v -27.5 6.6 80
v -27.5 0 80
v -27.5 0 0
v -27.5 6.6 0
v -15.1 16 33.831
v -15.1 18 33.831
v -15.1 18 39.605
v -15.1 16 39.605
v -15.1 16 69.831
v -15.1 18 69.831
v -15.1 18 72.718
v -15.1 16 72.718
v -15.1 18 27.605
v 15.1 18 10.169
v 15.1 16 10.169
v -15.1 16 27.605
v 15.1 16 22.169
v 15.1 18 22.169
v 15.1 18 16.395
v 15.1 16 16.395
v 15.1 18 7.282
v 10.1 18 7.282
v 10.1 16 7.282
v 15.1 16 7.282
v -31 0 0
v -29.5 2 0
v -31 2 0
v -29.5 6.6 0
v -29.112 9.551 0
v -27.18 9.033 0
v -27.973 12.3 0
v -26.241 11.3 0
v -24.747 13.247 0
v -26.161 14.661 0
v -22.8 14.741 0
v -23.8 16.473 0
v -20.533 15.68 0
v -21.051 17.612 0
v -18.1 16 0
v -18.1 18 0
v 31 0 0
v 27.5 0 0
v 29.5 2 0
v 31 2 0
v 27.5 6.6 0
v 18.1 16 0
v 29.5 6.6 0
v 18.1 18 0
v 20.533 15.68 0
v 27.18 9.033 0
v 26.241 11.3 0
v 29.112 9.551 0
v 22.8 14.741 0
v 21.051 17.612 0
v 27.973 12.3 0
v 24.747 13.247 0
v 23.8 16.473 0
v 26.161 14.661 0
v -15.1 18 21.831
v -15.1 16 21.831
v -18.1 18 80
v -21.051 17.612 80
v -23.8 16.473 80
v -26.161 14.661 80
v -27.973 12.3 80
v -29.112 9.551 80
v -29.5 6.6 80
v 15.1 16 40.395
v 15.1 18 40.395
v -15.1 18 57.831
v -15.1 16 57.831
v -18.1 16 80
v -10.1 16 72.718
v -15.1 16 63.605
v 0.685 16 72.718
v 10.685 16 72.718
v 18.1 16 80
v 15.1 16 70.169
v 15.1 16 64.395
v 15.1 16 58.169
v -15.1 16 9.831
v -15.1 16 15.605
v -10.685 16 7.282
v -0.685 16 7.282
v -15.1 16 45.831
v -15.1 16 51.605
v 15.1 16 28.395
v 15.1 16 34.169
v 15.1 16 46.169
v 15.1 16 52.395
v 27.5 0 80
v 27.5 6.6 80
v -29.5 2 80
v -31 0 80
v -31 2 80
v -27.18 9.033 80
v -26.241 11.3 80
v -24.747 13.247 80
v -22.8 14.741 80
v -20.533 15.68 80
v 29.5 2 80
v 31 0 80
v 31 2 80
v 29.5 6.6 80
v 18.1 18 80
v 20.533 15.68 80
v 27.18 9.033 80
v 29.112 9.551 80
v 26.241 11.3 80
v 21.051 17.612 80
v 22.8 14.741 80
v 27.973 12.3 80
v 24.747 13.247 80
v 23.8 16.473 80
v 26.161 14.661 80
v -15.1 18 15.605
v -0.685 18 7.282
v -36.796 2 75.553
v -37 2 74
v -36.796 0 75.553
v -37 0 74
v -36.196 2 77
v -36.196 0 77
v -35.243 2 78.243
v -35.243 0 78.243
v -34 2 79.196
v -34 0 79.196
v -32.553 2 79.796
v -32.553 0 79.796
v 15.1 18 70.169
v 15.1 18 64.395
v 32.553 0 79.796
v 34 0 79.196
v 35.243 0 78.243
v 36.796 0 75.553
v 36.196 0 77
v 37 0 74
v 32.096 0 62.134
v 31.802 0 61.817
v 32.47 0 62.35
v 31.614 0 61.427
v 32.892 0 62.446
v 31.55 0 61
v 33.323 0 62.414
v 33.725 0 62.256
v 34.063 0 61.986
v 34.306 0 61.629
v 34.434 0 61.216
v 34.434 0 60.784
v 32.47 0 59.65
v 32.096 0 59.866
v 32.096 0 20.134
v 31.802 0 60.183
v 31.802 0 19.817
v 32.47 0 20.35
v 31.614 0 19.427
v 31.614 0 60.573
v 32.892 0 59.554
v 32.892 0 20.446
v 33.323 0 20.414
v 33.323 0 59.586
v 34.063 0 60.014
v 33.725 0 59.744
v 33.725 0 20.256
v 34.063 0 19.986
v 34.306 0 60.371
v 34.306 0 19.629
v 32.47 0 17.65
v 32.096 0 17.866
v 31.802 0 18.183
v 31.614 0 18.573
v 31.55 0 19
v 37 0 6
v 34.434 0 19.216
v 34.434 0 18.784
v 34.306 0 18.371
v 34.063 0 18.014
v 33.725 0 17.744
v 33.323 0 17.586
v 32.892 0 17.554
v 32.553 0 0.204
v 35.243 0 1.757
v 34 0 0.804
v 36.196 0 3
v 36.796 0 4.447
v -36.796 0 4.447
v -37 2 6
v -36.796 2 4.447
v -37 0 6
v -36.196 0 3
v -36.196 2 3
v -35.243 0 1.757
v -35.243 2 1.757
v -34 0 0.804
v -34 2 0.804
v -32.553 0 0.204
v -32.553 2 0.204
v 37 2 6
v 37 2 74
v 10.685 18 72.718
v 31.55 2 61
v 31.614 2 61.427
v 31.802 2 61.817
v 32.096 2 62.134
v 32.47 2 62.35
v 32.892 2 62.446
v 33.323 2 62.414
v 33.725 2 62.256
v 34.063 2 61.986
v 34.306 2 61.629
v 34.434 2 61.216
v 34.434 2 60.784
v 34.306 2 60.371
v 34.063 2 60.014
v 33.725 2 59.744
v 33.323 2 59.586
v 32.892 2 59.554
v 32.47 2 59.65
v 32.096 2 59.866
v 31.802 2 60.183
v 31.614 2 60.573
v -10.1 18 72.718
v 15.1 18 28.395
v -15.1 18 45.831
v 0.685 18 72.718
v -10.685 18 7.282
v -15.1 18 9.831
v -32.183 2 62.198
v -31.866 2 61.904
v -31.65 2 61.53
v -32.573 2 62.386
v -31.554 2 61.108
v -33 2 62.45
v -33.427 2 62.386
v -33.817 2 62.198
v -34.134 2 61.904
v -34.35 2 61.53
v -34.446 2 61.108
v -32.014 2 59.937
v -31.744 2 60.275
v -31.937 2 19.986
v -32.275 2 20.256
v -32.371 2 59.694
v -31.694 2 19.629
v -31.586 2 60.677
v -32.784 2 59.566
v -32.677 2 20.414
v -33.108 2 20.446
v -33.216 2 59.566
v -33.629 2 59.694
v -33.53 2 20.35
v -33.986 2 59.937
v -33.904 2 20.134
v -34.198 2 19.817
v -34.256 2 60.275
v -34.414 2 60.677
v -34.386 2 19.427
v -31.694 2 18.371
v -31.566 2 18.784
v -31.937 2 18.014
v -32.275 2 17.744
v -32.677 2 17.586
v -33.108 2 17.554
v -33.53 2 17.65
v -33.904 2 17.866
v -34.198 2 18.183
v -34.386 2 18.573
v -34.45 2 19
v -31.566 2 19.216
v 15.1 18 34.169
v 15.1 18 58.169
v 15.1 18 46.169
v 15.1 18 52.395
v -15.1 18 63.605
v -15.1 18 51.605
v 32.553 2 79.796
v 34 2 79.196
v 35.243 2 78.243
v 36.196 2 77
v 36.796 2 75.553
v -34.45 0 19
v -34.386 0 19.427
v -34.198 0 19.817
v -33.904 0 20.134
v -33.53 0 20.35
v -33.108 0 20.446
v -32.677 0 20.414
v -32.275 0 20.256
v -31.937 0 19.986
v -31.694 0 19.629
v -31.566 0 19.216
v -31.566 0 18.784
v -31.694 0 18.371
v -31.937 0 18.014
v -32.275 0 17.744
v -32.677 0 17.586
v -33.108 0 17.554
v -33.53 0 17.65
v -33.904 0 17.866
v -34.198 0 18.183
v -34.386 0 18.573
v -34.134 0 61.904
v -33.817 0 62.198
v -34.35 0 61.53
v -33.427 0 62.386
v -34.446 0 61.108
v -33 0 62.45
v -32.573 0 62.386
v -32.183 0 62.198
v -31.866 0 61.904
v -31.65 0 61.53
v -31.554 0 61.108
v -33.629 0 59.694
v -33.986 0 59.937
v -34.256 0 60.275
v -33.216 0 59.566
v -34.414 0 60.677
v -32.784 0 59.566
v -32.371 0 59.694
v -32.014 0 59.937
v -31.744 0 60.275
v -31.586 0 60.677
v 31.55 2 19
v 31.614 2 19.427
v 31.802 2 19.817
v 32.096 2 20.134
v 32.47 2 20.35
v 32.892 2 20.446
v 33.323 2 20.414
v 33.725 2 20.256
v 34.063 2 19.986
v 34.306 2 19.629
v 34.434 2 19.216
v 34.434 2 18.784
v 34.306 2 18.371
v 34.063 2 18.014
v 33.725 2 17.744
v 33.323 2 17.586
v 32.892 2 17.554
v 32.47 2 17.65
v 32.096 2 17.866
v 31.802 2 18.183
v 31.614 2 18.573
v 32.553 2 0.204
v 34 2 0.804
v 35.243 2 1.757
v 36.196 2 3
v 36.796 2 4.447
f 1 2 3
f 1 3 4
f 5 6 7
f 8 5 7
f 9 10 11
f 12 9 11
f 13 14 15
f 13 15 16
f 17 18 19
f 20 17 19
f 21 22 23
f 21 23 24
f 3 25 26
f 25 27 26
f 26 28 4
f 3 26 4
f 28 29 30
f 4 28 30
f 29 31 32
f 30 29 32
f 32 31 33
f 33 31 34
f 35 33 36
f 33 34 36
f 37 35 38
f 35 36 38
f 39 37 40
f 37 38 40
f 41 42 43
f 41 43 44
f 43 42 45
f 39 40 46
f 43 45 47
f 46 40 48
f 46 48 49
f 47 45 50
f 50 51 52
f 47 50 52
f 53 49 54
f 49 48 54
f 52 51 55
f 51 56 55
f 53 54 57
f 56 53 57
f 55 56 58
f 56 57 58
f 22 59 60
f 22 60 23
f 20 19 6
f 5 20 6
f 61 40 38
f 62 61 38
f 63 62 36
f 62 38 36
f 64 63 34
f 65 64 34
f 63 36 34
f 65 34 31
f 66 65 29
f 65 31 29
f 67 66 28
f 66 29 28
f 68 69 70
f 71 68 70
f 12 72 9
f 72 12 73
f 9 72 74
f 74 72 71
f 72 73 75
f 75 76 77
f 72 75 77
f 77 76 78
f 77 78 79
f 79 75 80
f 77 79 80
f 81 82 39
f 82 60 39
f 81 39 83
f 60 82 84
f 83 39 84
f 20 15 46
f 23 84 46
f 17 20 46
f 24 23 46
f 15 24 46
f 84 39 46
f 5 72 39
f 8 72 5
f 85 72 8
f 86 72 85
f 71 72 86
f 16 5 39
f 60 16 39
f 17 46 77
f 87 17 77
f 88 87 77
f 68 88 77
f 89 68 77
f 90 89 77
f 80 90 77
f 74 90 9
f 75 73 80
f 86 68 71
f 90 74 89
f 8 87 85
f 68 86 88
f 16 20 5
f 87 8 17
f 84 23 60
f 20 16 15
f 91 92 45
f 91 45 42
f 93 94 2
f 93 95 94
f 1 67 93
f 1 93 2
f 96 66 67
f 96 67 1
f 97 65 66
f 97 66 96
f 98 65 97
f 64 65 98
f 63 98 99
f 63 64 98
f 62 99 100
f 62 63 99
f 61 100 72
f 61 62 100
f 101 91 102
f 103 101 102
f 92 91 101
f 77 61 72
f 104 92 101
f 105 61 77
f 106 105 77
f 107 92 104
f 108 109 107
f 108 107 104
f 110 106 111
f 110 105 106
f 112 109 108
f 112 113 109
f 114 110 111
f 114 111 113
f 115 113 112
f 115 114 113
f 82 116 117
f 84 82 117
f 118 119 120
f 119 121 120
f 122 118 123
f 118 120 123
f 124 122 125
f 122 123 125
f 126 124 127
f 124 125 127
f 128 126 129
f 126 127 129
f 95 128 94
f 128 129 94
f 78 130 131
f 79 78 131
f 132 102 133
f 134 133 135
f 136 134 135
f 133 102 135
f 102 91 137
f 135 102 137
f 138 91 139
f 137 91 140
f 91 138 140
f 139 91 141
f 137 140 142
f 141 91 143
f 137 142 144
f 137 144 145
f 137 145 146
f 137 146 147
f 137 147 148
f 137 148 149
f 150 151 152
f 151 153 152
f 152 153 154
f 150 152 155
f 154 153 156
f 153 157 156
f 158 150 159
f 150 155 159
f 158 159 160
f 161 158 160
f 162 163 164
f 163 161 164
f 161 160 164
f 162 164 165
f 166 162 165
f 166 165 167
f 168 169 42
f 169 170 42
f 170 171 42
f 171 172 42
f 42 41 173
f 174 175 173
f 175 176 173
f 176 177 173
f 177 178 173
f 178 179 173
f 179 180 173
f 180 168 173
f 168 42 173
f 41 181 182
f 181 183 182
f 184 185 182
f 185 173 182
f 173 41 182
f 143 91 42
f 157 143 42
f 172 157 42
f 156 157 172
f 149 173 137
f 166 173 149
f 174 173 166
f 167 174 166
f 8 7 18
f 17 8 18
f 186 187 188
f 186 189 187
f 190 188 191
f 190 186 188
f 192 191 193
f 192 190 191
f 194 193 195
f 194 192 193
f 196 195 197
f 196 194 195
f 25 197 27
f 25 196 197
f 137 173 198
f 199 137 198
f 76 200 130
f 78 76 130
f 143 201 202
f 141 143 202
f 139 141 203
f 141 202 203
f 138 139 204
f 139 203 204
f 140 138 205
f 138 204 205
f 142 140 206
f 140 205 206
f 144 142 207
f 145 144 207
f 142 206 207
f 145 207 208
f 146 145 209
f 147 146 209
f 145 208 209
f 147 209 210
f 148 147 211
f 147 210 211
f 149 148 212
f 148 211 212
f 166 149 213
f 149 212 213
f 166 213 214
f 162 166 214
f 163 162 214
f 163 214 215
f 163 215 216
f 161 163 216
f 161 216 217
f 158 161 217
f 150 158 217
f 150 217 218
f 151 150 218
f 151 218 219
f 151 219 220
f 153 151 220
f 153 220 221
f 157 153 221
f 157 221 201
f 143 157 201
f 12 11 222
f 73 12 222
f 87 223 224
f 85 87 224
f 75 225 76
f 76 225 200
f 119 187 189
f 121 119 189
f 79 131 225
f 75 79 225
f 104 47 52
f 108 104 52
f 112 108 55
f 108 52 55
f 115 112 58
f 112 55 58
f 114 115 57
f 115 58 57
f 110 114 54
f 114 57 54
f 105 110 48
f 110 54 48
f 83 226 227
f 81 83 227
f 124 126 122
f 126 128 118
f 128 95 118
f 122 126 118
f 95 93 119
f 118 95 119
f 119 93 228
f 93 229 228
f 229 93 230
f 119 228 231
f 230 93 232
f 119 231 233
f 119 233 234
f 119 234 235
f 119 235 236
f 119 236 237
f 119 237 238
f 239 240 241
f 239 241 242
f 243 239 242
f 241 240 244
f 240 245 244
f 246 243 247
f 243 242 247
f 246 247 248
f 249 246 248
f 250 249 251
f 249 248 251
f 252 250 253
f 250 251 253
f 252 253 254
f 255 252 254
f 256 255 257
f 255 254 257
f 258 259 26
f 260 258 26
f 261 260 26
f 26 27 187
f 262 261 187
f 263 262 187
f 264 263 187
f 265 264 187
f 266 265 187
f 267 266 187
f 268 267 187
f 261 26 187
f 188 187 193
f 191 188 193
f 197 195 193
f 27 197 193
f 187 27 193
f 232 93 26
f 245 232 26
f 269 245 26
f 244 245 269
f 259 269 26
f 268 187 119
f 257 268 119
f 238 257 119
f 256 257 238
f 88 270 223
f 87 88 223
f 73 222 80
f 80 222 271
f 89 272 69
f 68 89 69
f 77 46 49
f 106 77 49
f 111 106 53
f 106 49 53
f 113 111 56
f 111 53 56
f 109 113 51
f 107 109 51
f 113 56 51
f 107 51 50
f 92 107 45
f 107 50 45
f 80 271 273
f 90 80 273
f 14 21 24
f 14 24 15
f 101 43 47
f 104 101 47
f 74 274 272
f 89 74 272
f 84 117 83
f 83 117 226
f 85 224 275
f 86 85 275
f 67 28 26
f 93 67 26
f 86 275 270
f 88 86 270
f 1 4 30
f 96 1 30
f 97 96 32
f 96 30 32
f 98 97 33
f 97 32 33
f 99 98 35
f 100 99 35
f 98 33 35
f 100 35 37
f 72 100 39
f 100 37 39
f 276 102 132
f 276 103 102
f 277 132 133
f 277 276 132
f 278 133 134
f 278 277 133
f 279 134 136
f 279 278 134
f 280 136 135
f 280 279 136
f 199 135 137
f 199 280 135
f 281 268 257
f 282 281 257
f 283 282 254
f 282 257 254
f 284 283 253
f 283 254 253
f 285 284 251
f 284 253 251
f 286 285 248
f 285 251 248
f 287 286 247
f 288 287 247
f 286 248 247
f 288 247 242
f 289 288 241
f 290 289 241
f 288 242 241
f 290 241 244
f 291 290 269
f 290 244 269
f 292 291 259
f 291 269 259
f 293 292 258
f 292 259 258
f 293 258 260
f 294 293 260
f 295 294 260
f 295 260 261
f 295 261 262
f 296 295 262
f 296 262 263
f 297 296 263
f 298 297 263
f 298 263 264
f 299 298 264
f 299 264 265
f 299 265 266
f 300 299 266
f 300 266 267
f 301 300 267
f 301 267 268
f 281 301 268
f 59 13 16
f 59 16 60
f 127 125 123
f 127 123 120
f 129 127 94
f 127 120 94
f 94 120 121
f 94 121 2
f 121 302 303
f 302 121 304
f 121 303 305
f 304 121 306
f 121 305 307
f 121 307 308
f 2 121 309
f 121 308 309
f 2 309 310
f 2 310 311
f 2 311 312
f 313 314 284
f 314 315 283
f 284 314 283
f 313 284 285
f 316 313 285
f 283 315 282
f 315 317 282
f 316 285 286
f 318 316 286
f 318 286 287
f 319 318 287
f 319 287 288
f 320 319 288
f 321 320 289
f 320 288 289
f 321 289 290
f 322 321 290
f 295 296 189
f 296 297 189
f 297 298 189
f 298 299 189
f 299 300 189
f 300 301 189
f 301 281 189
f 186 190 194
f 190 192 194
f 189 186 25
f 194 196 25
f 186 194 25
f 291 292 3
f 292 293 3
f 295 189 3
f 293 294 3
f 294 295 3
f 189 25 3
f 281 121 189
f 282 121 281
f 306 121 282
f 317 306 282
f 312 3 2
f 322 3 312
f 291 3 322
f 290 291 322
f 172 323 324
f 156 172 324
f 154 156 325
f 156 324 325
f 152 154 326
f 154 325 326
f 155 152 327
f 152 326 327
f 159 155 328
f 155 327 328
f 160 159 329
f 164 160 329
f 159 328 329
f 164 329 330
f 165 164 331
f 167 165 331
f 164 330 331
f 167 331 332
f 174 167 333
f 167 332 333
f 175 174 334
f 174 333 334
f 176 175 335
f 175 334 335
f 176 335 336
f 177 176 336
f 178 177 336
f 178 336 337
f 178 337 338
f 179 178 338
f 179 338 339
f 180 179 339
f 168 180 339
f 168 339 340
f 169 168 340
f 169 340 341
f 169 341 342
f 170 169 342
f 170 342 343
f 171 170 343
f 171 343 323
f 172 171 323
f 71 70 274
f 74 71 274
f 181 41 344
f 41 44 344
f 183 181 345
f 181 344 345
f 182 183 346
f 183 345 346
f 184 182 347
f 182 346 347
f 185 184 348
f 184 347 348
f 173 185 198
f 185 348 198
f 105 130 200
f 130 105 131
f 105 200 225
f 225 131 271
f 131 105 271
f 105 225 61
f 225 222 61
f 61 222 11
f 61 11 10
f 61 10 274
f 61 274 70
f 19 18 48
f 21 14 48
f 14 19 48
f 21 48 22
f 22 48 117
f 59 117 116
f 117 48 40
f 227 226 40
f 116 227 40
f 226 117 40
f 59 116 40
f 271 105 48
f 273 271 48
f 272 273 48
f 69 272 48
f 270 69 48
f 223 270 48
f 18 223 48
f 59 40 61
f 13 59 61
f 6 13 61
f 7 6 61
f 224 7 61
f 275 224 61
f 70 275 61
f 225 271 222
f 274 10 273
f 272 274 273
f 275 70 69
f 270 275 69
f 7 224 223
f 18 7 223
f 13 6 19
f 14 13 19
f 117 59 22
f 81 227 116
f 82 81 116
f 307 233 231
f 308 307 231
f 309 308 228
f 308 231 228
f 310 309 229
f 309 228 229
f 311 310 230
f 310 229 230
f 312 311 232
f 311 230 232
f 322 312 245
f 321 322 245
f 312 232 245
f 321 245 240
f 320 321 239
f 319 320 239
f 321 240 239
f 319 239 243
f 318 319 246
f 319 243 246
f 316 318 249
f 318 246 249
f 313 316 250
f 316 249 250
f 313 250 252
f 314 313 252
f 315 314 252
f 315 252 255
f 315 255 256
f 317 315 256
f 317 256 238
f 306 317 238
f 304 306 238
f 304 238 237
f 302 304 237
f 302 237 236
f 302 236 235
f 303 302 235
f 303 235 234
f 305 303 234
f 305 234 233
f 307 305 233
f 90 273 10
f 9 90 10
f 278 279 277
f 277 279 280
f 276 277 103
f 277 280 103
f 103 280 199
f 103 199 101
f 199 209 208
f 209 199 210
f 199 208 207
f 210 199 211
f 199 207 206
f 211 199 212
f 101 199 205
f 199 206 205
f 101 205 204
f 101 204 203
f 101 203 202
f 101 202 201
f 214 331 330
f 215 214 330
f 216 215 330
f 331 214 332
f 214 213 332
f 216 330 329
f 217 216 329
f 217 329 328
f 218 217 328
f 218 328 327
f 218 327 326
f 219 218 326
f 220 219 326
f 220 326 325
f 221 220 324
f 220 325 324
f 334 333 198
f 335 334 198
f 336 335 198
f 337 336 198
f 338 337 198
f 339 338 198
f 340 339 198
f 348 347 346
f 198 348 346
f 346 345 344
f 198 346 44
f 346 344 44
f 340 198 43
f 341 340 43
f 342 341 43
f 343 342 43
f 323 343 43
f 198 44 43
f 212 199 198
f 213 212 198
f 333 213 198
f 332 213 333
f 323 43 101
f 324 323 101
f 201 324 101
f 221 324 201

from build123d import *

# Parameters (mm, degrees)
EXTRUDE_1_DEPTH     = 80
SKETCH_2_R          = 1.45
CUT_EXTRUDE_1_DEPTH = 80
FILLET_1_R          = 6
CUT_EXTRUDE_2_DEPTH = 10


with BuildPart() as part:
    # 草图1 → 凸台-拉伸1 (new body)
    with BuildSketch(Plane.XY):
        with BuildLine():
            Line((-37, 0), (-27.5, 0))
            Line((-27.5, 0), (-27.5, 6.6))
            ThreePointArc((-27.5, 6.6), (-24.746803743, 13.246803743), (-18.1, 16))
            Line((-18.1, 16), (18.1, 16))
            ThreePointArc((18.1, 16), (24.746803743, 13.246803743), (27.5, 6.6))
            Line((27.5, 6.6), (27.5, 0))
            Line((27.5, 0), (37, 0))
            Line((37, 0), (37, 2))
            Line((37, 2), (29.5, 2))
            Line((29.5, 2), (29.5, 6.6))
            ThreePointArc((29.5, 6.6), (26.161017306, 14.661017306), (18.1, 18))
            Line((18.1, 18), (-18.1, 18))
            ThreePointArc((-18.1, 18), (-26.161017306, 14.661017306), (-29.5, 6.6))
            Line((-29.5, 6.6), (-29.5, 2))
            Line((-29.5, 2), (-37, 2))
            Line((-37, 2), (-37, 0))
        make_face()
    extrude(amount=EXTRUDE_1_DEPTH)

    # 草图2 → 切除-拉伸1 (cut)
    with BuildSketch(Plane(origin=(0, 2, 0), x_dir=(1, 0, 0), z_dir=(0, 1, 0))):
        with Locations(Location((-33, -19, 0), (0, 0, 180))):
            Circle(SKETCH_2_R)
        with Locations(Location((-33, -61, 0), (0, 0, 270))):
            Circle(SKETCH_2_R)
        with Locations(Location((33, -61, 0), (0, 0, 180))):
            Circle(SKETCH_2_R)
        with Locations(Location((33, -19, 0), (0, 0, 180))):
            Circle(SKETCH_2_R)
    extrude(amount=-CUT_EXTRUDE_1_DEPTH, mode=Mode.SUBTRACT)

    # 圆角1
    fillet_1_edges = [part.edges().sort_by_distance(p)[0] for p in [
        (37, 1, 0),
        (-37, 1, 0),
        (37, 1, 80),
        (-37, 1, 80),
    ]]
    fillet(fillet_1_edges, radius=FILLET_1_R)

    # 草图3 → 切除-拉伸2 (cut)
    with BuildSketch(Plane(origin=(0, 18, 0), x_dir=(1, 0, 0), z_dir=(0, 1, 0))):
        Polygon((0.684609691, -72.718226784), (10.684609691, -72.718226784), (15.1, -70.169), (15.1, -64.395497308), align=None)
        Polygon((-15.1, -72.718226784), (-10.1, -72.718226784), (15.1, -58.169), (15.1, -52.395497308), (-15.1, -69.831475438), align=None)
        Polygon((-15.1, -57.831475438), (-15.1, -63.60497813), (15.1, -46.169), (15.1, -40.395497308), align=None)
        Polygon((-15.1, -45.831475438), (-15.1, -51.60497813), (15.1, -34.169), (15.1, -28.395497308), align=None)
        Polygon((-15.1, -33.831475438), (-15.1, -39.60497813), (15.1, -22.169), (15.1, -16.395497308), align=None)
        Polygon((10.1, -7.282248654), (15.1, -7.282248654), (15.1, -10.169), (-15.1, -27.60497813), (-15.1, -21.831475438), align=None)
        Polygon((-15.1, -9.831475438), (-15.1, -15.60497813), (-0.684609691, -7.282248654), (-10.684609691, -7.282248654), align=None)
    extrude(amount=-CUT_EXTRUDE_2_DEPTH, mode=Mode.SUBTRACT)


solid = part.part
